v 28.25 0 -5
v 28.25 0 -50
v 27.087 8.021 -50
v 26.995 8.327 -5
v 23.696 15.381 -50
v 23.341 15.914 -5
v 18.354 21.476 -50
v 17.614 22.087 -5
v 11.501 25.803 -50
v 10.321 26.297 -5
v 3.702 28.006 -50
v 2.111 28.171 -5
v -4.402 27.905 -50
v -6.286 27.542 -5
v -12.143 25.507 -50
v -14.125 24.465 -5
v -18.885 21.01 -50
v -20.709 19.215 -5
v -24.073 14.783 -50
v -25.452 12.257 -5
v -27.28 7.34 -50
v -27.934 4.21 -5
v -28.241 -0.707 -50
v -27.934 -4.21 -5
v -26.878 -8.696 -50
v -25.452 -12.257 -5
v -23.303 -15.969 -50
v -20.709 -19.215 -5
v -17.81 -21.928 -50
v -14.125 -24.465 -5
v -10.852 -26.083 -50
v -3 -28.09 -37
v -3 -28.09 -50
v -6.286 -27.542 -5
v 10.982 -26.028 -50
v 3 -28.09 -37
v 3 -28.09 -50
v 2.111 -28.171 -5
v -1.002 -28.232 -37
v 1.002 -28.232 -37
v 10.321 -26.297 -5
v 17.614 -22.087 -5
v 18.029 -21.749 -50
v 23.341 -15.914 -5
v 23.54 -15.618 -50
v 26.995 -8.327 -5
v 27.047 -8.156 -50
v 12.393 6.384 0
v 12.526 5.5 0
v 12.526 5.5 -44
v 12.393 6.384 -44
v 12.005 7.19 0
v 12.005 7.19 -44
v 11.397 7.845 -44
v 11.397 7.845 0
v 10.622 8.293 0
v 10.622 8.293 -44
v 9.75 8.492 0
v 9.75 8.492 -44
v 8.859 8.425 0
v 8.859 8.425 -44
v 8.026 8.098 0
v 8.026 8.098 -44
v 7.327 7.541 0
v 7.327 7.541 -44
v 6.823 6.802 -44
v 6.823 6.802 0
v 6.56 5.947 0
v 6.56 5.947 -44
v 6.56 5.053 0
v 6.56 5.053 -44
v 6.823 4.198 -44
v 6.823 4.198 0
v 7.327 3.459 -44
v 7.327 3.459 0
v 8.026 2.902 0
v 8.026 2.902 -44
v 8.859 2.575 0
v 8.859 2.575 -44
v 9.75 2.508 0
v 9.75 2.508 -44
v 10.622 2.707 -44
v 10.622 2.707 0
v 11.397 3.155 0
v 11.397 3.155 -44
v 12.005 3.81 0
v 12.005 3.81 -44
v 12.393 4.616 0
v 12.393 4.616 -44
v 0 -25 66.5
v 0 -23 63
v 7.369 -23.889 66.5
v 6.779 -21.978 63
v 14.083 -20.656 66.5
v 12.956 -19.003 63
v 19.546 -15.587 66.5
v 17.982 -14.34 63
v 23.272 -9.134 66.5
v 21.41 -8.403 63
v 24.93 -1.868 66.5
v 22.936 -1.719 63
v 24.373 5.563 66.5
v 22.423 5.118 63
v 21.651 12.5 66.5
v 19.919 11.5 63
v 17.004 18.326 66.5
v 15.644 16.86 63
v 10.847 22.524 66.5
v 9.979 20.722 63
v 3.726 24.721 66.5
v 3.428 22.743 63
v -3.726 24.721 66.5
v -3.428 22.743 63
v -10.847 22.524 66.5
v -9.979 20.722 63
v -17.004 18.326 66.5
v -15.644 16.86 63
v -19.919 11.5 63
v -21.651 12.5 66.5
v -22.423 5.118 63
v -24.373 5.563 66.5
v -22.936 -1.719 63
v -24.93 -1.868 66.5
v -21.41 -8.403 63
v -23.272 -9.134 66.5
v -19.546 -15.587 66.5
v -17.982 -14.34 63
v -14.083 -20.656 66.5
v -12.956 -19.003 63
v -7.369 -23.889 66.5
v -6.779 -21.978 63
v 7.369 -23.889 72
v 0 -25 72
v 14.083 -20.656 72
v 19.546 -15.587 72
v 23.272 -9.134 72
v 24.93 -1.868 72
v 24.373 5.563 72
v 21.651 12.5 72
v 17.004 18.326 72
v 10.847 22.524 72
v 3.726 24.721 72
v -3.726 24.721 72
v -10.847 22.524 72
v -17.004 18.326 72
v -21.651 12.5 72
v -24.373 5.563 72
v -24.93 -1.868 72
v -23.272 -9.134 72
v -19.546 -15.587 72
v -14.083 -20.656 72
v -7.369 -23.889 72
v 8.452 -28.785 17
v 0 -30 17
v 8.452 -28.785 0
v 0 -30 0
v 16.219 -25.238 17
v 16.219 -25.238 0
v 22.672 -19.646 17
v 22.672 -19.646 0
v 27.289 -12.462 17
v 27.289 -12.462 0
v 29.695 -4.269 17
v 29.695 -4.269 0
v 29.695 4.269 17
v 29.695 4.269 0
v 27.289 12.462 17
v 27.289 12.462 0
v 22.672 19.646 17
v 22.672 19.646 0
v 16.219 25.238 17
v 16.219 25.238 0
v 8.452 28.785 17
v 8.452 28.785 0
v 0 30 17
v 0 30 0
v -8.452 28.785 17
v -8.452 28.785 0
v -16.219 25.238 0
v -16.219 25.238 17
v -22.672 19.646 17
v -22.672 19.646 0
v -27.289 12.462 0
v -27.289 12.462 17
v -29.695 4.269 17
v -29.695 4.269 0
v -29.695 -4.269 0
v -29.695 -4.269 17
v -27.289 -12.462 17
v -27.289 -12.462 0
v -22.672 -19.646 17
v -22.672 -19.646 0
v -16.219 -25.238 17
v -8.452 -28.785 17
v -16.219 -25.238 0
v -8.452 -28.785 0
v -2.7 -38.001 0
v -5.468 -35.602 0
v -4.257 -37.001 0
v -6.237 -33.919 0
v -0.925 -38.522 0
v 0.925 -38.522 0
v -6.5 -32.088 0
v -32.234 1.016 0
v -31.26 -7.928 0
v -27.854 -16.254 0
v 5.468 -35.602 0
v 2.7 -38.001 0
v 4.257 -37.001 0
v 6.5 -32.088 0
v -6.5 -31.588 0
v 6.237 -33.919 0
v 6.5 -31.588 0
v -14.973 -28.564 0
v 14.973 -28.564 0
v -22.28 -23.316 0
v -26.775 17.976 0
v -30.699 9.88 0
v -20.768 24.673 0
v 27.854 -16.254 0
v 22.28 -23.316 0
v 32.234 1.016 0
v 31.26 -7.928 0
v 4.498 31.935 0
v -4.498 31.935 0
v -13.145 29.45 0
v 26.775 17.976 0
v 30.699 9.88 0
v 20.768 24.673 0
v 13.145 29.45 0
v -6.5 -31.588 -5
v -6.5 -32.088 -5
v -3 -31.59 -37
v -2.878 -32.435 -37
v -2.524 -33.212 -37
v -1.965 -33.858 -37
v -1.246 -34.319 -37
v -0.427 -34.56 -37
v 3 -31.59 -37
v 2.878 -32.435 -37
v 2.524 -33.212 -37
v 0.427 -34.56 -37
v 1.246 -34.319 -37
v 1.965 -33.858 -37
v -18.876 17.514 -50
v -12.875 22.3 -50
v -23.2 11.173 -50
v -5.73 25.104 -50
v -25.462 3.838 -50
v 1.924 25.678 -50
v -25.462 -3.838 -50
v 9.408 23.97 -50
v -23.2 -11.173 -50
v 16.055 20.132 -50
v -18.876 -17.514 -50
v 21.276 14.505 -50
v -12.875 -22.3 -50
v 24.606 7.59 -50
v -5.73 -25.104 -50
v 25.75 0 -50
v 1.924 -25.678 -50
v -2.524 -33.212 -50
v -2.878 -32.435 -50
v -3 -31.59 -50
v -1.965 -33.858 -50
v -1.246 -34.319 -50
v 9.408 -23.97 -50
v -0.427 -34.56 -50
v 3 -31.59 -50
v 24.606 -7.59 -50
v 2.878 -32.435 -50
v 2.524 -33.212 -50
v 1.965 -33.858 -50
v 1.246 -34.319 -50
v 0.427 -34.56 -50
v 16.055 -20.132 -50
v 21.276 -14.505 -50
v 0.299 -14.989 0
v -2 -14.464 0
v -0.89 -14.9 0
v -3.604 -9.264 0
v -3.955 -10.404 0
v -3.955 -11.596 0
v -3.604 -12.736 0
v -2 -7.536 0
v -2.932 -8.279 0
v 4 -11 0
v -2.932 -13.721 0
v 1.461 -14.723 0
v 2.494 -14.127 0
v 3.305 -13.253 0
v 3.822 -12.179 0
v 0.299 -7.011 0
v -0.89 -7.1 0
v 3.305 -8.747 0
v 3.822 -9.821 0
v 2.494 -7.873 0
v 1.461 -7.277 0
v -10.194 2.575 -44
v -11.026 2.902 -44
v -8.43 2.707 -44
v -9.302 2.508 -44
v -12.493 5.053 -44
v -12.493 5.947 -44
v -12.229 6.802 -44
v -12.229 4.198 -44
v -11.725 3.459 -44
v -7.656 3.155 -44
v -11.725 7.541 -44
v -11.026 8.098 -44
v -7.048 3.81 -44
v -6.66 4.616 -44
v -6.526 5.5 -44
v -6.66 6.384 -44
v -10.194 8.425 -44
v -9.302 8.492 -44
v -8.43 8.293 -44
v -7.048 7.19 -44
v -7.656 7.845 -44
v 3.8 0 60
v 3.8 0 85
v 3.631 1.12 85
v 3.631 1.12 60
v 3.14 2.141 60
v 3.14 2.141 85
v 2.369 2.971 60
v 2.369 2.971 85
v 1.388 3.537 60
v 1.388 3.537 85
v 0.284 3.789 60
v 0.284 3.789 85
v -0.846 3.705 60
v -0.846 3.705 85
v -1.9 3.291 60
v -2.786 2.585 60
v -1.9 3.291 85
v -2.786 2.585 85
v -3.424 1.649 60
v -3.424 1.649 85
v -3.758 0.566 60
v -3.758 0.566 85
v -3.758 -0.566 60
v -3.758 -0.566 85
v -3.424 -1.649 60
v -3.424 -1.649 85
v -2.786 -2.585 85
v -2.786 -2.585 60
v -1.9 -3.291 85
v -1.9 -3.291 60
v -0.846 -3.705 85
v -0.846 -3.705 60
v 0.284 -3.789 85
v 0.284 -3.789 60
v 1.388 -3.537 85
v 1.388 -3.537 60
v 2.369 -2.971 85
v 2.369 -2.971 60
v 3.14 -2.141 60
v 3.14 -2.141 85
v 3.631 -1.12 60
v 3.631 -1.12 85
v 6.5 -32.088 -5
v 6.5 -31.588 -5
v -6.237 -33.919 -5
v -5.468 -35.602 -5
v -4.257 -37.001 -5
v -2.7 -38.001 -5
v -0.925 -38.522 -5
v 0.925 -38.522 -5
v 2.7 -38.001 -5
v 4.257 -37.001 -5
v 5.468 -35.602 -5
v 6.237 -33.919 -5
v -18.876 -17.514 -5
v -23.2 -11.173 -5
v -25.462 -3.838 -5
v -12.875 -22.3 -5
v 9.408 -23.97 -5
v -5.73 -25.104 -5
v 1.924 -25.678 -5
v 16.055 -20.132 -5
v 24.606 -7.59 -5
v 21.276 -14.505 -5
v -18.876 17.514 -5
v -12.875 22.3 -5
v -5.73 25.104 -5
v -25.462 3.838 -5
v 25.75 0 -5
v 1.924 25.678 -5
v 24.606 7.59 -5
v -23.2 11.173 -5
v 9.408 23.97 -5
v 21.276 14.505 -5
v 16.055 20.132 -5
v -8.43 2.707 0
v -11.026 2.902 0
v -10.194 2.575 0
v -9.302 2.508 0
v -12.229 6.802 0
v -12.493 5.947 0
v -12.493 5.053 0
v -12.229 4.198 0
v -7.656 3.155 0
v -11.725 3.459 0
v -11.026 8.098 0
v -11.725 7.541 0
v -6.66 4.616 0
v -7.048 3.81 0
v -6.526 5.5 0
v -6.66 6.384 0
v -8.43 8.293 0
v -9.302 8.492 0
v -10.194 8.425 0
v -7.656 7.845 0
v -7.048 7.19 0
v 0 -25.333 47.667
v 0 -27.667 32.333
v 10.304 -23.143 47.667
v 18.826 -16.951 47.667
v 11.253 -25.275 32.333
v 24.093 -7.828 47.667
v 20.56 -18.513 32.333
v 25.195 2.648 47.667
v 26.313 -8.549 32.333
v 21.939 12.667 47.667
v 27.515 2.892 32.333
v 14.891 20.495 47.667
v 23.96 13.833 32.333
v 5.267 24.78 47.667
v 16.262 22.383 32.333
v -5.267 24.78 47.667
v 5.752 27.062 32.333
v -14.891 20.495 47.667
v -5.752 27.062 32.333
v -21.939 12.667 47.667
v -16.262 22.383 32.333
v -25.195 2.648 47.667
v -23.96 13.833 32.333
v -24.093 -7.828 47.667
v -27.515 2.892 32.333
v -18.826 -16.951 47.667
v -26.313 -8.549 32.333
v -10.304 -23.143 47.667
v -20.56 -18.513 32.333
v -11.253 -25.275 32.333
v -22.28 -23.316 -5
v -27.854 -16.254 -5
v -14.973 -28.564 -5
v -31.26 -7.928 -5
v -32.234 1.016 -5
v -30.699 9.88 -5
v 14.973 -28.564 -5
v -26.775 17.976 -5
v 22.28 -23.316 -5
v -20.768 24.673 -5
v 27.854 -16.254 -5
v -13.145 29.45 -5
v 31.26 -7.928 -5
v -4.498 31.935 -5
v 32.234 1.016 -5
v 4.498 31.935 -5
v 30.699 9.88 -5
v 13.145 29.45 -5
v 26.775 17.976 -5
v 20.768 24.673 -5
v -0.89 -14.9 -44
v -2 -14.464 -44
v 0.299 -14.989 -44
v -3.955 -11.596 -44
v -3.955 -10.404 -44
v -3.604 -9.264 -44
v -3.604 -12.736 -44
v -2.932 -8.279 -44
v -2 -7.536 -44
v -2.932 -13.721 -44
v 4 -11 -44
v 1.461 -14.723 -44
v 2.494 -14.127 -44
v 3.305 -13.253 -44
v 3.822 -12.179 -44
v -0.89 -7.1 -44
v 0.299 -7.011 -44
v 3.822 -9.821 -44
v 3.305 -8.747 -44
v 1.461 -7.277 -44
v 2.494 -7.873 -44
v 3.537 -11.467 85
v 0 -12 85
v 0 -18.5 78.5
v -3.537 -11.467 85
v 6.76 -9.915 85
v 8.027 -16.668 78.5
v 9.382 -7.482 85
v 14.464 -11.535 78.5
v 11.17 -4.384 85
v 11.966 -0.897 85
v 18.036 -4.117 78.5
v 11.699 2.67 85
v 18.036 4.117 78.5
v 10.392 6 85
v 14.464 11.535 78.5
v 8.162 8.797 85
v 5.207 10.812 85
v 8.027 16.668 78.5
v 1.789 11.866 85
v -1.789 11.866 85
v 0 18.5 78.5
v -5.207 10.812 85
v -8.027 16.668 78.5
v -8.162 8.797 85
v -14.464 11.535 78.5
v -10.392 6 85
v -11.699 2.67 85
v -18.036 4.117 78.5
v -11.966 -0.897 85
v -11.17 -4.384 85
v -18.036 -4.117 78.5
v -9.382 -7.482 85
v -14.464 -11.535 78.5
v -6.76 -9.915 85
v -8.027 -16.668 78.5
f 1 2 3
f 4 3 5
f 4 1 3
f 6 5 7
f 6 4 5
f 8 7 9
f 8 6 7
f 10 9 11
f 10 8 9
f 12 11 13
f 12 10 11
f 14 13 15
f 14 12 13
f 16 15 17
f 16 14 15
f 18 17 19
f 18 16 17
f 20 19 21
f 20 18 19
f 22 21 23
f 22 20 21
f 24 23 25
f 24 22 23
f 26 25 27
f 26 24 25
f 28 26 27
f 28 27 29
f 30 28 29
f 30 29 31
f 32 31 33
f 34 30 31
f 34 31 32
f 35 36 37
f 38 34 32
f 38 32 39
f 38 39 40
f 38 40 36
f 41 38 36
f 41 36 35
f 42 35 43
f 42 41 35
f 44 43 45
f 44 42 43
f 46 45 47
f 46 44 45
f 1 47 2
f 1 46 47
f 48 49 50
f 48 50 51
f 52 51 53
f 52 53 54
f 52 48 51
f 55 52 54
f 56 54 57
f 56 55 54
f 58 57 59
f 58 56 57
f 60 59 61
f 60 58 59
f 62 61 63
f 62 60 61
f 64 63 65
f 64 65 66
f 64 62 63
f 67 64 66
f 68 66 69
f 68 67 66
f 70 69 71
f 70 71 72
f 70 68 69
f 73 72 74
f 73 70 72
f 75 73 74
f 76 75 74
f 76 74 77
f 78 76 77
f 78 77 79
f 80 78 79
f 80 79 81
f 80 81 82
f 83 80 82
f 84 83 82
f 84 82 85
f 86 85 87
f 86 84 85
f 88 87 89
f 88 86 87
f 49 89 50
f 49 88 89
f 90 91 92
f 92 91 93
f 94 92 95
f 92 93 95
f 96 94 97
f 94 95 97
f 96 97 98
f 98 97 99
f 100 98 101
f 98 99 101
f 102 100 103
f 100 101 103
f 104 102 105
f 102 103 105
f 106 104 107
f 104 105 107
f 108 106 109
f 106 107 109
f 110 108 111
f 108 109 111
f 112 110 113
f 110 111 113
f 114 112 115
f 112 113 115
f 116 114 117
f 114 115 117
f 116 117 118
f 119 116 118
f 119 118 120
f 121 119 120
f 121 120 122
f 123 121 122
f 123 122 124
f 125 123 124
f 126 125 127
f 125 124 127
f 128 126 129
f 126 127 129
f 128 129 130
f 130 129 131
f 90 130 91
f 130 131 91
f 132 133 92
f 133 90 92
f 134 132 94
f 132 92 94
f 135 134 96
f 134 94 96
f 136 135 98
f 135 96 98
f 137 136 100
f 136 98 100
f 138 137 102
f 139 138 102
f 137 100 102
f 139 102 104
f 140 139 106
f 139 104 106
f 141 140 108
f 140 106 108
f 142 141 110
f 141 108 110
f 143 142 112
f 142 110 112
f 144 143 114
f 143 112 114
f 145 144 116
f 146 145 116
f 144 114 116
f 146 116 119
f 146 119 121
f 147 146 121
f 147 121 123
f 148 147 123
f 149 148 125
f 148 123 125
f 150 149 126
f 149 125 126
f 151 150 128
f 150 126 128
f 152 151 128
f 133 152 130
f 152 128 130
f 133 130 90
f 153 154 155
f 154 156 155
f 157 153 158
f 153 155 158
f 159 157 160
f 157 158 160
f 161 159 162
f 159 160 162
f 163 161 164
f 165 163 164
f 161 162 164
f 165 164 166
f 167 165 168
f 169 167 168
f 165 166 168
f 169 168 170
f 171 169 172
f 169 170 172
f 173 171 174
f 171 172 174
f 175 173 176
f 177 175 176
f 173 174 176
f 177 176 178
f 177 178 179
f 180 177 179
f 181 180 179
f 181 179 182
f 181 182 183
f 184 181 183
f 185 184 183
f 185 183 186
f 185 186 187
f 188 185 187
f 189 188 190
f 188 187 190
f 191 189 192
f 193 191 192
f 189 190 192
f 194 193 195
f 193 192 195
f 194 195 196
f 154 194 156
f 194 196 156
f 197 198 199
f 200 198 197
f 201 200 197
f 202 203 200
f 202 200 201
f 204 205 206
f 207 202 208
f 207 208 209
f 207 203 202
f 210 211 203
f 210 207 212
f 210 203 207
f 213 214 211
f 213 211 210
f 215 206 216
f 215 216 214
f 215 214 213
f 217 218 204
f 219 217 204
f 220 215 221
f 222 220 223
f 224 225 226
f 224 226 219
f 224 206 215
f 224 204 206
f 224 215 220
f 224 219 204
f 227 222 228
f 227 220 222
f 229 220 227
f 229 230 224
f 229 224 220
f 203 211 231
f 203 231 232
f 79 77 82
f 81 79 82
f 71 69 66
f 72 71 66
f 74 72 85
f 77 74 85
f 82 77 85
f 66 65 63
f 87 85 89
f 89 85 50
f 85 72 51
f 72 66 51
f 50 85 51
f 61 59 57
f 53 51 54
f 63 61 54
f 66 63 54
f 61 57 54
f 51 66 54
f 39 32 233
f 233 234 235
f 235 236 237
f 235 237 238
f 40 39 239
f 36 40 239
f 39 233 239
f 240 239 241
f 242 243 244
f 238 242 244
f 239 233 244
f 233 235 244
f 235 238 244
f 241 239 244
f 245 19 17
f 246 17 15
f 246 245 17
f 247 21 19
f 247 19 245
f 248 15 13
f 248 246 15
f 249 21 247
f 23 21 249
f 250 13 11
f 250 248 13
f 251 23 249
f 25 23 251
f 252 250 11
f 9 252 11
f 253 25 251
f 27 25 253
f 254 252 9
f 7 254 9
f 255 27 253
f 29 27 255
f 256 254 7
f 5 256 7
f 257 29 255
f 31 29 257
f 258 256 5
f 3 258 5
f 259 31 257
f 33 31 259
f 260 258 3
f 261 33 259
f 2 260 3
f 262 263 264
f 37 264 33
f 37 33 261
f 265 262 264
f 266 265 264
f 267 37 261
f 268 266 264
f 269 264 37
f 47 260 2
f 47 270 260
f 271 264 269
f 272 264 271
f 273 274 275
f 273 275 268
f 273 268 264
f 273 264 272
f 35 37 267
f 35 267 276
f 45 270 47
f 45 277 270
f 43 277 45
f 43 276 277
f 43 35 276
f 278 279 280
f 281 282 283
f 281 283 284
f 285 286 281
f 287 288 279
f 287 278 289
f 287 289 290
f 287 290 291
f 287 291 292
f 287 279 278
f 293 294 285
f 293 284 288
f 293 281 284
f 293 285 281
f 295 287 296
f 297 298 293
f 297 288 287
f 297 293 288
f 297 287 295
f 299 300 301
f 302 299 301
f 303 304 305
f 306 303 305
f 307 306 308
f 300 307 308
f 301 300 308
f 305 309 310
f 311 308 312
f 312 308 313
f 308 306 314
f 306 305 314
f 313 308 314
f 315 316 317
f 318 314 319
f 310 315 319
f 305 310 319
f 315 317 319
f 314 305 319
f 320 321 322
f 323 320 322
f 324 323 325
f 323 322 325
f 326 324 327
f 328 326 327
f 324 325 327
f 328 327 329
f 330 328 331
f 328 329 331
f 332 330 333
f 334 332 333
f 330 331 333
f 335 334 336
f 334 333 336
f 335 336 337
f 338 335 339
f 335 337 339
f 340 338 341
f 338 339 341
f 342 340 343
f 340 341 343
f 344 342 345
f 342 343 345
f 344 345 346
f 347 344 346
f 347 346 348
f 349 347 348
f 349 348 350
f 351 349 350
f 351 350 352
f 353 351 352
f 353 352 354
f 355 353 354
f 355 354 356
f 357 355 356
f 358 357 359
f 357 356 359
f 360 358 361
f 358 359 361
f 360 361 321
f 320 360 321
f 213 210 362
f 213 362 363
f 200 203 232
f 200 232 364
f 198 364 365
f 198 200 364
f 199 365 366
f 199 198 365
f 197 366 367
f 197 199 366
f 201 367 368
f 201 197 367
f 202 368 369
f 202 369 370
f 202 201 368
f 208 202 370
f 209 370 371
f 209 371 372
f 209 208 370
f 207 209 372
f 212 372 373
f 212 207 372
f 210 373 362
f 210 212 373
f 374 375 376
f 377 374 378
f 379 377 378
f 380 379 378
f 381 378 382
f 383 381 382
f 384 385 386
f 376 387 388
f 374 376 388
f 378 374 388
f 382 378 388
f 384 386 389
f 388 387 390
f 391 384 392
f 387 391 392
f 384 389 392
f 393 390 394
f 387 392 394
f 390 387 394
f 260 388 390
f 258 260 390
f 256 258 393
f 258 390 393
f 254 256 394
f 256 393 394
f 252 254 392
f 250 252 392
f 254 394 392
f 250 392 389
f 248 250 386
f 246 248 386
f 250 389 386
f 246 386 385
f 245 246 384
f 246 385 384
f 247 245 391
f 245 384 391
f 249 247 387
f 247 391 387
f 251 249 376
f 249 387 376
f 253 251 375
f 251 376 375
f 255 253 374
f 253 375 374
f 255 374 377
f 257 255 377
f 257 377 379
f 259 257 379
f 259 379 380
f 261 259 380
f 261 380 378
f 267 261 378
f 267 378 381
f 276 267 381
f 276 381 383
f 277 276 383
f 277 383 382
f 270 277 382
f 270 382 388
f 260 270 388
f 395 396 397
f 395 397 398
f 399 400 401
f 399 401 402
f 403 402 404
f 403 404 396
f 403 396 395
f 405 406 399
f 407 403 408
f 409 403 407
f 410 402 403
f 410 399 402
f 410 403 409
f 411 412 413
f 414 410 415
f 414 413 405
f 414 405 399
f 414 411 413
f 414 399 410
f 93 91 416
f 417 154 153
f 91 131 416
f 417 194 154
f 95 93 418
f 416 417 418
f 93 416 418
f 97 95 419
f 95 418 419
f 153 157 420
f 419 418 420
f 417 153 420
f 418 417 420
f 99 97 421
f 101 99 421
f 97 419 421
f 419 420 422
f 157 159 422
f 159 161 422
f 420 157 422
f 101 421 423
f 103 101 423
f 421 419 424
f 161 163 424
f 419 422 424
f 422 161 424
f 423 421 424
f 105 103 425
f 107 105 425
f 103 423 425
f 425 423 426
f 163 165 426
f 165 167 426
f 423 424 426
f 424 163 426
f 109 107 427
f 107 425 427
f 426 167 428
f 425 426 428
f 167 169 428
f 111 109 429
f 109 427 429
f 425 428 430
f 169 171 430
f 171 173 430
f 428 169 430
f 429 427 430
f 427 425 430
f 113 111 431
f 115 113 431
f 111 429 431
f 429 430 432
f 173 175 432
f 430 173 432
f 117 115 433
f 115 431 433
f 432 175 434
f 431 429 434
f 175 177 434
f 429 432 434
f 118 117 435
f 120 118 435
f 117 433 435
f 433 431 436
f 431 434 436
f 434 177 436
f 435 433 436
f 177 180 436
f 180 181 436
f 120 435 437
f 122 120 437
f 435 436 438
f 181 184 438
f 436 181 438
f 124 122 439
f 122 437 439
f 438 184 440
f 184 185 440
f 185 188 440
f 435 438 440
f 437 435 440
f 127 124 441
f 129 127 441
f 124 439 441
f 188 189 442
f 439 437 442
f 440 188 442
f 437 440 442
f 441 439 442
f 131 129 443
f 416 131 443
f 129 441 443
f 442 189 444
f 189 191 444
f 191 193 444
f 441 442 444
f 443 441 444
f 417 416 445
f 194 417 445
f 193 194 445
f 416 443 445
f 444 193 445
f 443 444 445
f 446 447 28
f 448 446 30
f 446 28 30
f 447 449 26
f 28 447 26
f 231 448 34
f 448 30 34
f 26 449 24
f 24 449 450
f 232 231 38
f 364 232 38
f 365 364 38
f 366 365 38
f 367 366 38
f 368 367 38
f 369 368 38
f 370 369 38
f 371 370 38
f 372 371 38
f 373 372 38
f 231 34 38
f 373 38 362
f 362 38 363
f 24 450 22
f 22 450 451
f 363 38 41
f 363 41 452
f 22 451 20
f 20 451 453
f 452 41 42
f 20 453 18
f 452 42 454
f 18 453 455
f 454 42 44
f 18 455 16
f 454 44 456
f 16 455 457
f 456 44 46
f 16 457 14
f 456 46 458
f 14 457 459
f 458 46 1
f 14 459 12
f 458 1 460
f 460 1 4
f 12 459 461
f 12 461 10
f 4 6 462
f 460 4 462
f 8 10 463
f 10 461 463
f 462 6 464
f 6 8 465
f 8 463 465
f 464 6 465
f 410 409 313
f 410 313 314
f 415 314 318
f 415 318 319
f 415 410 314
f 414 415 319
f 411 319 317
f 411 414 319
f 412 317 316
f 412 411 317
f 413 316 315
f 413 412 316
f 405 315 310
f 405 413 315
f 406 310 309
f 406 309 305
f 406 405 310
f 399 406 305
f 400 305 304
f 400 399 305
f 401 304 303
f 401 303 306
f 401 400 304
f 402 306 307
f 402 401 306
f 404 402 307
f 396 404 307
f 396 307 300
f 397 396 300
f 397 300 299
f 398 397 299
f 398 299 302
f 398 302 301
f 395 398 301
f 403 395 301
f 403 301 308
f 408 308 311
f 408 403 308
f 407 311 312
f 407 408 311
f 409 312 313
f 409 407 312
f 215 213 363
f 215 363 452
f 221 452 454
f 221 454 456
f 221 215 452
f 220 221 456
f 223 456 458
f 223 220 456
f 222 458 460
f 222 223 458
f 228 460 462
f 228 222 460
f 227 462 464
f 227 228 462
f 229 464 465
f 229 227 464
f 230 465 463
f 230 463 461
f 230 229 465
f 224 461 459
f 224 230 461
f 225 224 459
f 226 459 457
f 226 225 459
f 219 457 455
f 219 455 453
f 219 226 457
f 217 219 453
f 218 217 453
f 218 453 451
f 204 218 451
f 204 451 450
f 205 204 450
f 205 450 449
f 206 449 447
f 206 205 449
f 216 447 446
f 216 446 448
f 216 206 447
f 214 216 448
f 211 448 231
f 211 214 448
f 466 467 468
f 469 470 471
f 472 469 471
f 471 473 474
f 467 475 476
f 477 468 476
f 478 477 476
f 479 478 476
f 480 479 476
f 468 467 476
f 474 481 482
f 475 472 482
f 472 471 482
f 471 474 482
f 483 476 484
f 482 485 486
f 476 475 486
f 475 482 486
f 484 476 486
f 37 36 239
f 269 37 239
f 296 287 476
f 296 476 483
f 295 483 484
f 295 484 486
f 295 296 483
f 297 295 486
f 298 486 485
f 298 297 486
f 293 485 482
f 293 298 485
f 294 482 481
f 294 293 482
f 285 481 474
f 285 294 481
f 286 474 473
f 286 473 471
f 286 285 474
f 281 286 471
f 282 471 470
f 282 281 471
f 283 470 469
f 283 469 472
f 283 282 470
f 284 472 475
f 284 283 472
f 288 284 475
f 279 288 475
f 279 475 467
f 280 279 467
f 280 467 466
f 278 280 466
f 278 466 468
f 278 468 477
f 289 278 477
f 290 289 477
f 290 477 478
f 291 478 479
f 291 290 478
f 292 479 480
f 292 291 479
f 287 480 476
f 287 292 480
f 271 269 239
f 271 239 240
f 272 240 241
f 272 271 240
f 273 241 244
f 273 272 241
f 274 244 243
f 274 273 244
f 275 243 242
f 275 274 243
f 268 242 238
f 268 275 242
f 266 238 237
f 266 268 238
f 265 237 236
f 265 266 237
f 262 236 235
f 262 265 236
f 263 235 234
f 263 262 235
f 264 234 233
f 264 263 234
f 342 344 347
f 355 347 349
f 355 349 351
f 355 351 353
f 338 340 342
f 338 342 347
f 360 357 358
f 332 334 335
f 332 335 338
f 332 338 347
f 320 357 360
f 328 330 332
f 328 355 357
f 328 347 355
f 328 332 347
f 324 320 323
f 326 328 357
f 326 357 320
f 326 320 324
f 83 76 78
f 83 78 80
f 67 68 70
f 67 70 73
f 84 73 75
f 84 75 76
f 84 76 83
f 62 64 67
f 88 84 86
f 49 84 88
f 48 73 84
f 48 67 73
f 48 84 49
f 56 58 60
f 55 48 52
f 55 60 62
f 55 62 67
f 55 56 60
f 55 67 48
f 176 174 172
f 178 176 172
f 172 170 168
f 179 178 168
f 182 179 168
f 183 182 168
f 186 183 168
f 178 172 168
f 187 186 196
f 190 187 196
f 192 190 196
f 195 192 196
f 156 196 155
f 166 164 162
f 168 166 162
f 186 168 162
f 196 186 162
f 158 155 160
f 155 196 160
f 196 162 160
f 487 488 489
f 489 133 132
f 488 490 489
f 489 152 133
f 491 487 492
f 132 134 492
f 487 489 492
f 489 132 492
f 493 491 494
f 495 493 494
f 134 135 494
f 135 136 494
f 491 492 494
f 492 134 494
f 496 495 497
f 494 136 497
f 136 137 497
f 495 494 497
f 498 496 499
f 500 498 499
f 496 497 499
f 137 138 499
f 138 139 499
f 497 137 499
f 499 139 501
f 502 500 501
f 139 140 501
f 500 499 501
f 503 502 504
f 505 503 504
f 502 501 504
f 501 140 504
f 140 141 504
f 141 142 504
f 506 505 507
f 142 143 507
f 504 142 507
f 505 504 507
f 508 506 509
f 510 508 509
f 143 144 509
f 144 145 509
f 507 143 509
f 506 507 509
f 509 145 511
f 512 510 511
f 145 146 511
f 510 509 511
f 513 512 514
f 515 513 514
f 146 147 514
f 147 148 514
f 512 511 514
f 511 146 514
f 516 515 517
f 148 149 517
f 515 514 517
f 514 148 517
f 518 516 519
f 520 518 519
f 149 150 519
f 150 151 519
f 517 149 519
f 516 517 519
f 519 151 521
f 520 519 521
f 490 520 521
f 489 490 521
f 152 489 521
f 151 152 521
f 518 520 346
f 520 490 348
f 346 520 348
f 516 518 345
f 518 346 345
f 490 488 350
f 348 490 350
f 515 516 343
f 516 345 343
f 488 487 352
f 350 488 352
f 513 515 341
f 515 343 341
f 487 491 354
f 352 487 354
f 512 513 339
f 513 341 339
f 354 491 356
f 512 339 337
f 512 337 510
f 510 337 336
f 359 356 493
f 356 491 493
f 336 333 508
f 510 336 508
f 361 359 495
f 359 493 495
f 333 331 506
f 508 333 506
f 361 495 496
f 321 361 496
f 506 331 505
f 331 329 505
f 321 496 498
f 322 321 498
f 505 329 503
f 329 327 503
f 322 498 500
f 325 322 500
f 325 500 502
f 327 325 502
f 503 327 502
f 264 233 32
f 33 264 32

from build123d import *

# Parameters (mm, degrees)
F1_DEPTH  = 5
F2_R      = 28.25
F2_R_2    = 25.75
F3_DEPTH  = 50
F5_DEPTH  = 13
F6_R      = 4
F6_R_2    = 3
F7_DEPTH  = 44
F10_R     = 3.8
F11_DEPTH = 25


with BuildPart() as f1:
    # F0 (on Top) → F1 (new body)
    with BuildSketch(Plane.XY):
        with BuildLine():
            Line((6.5, -32.08817), (6.5, -31.58817))
            ThreePointArc((6.5, -31.58817), (0, 32.25), (-6.5, -31.58817))
            Line((-6.5, -31.58817), (-6.5, -32.08817))
            ThreePointArc((-6.5, -32.08817), (0, -38.58817), (6.5, -32.08817))
        make_face()
    extrude(amount=-F1_DEPTH)

    # F2 (on face) → F3 (join)
    with BuildSketch(Plane.XY):
        Circle(F2_R)
        Circle(F2_R_2, mode=Mode.SUBTRACT)
    extrude(amount=-F3_DEPTH)

    # F4 (on face) → F5 (join)
    with BuildSketch(Plane(origin=(0, 0, -50), x_dir=(1, 0, 0), z_dir=(0, 0, -1))):
        with BuildLine():
            Line((-3, 31.590256), (-3, 28.090256))
            ThreePointArc((-3, 28.090256), (0, 28.25), (3, 28.090256))
            Line((3, 28.090256), (3, 31.590256))
            ThreePointArc((3, 31.590256), (0, 34.590256), (-3, 31.590256))
        make_face()
    extrude(amount=-F5_DEPTH)


with BuildPart() as f7:
    # F6 (on face) → F7 (new body)
    with BuildSketch(Plane.XY):
        with Locations((0, -11)):
            Circle(F6_R)
        with Locations((9.526279, 5.5)):
            Circle(F6_R_2)
        with Locations((-9.526279, 5.5)):
            Circle(F6_R_2)
    extrude(amount=-F7_DEPTH)


with BuildPart() as f9:
    # F8 (on Right) → F9 (revolve)
    with BuildSketch(Plane.YZ):
        Polygon((-30, 0), (0, 0), (0, 85), (-12, 85), (-25, 72), (-25, 66.5), (-23, 63), (-30, 17), align=None)
    revolve(axis=Axis((0, 0, 72.046123), (0, 0, 1)))

    # F10 (on face) → F11 (cut)
    with BuildSketch(Plane.XY.offset(85)):
        Circle(F10_R)
    extrude(amount=-F11_DEPTH, mode=Mode.SUBTRACT)


solid = Compound([f1.part, f7.part, f9.part])
